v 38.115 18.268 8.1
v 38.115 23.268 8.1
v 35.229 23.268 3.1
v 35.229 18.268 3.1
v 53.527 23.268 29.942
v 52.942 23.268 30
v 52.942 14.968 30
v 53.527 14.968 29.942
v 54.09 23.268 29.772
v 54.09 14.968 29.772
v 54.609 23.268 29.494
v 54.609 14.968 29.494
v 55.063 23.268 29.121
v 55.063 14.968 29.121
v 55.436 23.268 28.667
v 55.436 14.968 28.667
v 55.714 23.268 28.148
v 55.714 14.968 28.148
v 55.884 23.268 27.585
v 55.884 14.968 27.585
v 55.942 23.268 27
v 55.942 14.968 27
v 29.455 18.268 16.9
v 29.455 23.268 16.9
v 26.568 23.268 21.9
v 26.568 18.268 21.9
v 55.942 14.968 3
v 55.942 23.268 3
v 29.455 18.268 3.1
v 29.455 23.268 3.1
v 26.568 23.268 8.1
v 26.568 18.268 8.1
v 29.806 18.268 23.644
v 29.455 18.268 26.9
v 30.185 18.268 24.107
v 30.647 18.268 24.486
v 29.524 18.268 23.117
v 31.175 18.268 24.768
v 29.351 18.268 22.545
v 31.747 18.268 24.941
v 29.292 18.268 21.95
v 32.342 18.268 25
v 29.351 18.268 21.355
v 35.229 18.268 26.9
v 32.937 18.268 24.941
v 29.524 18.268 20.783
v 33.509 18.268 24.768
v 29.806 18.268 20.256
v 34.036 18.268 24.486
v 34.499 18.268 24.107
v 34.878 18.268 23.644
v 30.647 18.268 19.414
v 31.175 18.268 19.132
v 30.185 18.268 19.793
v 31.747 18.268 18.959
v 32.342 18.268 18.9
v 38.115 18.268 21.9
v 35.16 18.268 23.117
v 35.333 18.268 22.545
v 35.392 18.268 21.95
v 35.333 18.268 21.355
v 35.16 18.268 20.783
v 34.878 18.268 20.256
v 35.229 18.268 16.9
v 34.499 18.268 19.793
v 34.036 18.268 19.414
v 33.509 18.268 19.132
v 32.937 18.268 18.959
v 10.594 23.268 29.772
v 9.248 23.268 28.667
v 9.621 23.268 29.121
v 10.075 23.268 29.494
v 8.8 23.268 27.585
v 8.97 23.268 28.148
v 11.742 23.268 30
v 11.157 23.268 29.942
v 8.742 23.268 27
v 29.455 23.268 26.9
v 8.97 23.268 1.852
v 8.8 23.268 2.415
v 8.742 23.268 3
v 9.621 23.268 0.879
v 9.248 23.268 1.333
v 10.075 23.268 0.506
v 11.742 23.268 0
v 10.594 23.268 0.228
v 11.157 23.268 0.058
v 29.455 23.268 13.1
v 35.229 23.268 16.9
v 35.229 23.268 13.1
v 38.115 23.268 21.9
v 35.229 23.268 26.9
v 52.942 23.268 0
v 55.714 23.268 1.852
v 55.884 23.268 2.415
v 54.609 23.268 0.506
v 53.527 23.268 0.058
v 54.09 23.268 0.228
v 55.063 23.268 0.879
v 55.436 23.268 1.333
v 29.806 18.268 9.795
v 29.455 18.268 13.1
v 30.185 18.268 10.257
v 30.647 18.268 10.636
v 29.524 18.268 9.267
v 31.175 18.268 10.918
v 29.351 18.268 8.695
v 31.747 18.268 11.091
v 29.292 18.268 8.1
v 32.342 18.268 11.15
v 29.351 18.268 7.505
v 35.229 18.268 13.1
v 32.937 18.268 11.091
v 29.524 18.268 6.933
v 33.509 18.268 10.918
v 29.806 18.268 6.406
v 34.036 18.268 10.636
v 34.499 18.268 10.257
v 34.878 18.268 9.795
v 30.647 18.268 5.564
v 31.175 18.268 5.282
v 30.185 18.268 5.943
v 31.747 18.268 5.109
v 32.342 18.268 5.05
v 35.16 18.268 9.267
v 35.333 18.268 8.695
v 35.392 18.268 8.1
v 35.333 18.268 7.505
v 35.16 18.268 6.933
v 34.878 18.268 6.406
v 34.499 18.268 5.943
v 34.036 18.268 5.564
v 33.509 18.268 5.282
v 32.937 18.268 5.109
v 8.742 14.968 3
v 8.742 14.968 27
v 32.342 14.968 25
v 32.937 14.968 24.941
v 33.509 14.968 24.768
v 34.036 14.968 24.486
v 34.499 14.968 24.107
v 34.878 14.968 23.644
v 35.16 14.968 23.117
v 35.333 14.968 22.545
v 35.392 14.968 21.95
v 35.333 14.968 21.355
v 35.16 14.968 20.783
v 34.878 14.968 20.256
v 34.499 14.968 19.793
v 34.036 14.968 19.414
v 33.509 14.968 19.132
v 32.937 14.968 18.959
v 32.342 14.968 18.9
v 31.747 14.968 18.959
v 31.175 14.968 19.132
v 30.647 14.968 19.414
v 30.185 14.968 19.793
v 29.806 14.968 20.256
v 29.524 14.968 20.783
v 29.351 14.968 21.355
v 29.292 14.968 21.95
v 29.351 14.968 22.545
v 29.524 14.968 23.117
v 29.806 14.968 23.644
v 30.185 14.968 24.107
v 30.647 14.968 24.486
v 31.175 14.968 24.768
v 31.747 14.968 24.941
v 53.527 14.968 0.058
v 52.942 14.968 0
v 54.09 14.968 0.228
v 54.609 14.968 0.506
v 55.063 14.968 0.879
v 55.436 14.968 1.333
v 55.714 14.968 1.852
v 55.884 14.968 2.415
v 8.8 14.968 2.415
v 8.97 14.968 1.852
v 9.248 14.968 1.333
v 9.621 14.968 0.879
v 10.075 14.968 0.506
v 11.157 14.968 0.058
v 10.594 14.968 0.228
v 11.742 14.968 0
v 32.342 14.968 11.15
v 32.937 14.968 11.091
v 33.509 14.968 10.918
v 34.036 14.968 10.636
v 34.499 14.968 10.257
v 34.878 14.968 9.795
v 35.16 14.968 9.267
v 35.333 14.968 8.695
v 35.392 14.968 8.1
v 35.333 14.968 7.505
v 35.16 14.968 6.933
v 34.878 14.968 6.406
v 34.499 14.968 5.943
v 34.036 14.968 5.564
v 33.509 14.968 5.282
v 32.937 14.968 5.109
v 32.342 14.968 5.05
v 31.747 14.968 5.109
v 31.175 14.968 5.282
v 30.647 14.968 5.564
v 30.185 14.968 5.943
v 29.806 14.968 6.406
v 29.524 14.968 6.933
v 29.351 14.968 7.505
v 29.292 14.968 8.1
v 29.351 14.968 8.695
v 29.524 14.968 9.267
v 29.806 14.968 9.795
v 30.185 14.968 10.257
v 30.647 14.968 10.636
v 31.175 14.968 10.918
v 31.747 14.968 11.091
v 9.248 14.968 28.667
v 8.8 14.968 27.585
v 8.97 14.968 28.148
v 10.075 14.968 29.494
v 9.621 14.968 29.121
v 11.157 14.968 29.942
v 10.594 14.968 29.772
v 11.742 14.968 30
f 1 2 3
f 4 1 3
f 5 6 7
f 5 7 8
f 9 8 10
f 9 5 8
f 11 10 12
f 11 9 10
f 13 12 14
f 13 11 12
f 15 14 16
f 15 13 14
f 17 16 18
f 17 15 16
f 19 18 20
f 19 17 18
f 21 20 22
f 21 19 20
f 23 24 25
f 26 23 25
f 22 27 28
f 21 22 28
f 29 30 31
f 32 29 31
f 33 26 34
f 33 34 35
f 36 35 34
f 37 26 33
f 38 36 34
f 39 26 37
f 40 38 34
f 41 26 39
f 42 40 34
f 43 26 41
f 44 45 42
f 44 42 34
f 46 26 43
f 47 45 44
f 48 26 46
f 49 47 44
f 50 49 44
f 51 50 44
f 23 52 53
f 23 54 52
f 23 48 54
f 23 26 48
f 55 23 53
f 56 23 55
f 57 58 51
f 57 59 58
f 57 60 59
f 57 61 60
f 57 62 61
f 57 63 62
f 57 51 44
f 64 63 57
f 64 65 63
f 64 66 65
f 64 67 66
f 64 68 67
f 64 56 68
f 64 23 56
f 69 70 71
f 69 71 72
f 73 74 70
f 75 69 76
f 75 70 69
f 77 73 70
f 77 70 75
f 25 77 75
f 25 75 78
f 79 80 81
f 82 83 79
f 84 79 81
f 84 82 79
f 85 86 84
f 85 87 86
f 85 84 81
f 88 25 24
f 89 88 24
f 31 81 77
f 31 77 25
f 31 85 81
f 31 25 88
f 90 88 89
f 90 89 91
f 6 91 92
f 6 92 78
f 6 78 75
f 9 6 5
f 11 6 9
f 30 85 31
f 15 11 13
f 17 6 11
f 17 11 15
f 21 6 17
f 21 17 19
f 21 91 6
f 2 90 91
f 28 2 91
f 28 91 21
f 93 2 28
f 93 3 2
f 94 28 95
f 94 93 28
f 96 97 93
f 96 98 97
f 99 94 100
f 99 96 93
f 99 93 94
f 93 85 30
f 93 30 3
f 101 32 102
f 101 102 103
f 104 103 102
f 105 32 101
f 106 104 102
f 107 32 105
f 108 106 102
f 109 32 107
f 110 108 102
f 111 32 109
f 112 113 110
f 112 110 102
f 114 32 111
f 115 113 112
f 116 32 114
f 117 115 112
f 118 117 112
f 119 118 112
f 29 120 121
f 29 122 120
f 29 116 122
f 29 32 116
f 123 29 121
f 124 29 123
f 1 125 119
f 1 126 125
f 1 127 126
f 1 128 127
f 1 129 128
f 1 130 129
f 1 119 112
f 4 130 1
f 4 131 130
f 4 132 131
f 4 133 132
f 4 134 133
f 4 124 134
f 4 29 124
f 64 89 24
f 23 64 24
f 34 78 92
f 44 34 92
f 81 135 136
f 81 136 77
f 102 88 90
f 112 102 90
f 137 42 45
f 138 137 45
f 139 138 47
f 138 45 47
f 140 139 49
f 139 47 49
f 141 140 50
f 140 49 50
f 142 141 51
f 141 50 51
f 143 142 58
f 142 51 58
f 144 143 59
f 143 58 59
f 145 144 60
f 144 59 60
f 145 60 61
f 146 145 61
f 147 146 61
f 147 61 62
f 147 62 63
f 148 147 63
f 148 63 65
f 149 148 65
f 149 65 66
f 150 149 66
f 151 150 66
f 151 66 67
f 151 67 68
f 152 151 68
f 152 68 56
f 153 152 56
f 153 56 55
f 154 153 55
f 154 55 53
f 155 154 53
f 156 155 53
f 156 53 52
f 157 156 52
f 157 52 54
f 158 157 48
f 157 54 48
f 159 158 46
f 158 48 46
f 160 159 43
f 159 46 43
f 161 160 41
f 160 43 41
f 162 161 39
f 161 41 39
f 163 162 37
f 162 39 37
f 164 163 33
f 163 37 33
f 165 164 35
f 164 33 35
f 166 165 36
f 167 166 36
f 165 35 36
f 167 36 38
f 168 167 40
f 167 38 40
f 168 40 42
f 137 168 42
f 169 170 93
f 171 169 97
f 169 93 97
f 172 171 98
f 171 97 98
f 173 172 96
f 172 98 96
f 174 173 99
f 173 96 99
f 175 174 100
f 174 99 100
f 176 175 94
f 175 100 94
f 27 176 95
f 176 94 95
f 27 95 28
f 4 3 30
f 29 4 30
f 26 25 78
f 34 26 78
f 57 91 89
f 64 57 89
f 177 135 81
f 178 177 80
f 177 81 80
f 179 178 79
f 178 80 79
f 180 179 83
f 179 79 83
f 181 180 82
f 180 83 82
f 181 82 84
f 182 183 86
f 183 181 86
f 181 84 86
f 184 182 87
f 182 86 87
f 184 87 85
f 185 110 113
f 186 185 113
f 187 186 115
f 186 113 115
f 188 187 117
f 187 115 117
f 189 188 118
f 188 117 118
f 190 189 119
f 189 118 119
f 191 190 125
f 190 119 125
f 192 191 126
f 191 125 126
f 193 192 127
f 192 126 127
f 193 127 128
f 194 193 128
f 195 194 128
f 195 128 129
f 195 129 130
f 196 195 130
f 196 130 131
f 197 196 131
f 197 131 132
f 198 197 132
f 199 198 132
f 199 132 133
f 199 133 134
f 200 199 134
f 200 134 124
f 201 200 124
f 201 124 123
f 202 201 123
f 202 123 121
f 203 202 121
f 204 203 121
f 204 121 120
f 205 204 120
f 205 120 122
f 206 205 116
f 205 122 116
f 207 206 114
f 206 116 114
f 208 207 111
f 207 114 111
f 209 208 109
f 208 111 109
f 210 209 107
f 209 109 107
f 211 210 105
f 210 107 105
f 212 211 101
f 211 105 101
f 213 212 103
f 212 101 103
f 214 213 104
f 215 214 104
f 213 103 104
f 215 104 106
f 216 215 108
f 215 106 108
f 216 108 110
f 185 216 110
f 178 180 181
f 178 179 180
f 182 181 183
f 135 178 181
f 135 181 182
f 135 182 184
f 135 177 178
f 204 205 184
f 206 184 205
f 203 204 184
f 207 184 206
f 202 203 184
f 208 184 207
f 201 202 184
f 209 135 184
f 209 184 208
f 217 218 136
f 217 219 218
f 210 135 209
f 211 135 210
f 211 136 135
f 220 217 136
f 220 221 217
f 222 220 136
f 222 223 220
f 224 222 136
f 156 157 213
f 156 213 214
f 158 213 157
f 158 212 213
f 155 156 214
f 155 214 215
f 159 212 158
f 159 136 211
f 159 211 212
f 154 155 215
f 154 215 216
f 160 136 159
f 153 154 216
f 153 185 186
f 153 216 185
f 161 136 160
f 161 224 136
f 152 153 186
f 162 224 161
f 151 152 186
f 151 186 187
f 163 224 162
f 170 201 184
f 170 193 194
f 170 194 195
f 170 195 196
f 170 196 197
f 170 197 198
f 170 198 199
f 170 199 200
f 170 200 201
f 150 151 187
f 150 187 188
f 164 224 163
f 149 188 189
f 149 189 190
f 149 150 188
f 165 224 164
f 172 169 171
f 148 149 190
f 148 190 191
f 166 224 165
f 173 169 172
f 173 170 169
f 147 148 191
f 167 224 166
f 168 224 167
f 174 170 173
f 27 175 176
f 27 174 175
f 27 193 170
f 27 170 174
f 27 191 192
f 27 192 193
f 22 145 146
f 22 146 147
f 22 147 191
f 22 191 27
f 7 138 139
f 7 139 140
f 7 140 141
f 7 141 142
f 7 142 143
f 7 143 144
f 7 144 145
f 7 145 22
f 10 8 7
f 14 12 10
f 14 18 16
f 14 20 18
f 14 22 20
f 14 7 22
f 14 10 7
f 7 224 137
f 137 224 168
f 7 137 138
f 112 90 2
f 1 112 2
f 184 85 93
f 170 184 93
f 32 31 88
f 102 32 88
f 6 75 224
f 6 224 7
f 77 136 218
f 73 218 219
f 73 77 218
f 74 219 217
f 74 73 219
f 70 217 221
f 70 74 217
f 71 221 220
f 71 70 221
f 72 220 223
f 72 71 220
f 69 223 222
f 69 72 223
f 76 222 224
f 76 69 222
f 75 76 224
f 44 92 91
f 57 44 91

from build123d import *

# Parameters (mm, degrees)
ESQUISSE2_W             = 47.2
ESQUISSE2_H             = 18.3
BOSS_EXTRU_3_DEPTH      = 30
ENL_V_MAT_EXTRU_1_DEPTH = 5
ESQUISSE6_R             = 3.05
ENL_V_MAT_EXTRU_2_DEPTH = 29
CONG_1_R                = 3
ESQUISSE7_W             = 56.209091813
ESQUISSE7_H             = 35.087501562
ENL_V_MAT_EXTRU_3_DEPTH = 10


with BuildPart() as part:
    # Esquisse2 → Boss.-Extru.3 (new body)
    with BuildSketch(Plane.XY):
        with Locations((32.341918096, 14.118251)):
            Rectangle(ESQUISSE2_W, ESQUISSE2_H)
    extrude(amount=BOSS_EXTRU_3_DEPTH)

    # Esquisse3 → Enlèv. mat.-Extru.1 (cut)
    with BuildSketch(Plane(origin=(0, 23.268251, 0), x_dir=(1, 0, 0), z_dir=(0, 1, 0))):
        Polygon((38.115420787, -8.1), (35.228669442, -3.1), (29.45516675, -3.1), (26.568415404, -8.1), (29.45516675, -13.1), (35.228669442, -13.1), align=None)
        Polygon((38.115420787, -21.9), (35.228669442, -16.9), (29.45516675, -16.9), (26.568415404, -21.9), (29.45516675, -26.9), (35.228669442, -26.9), align=None)
    extrude(amount=-ENL_V_MAT_EXTRU_1_DEPTH, mode=Mode.SUBTRACT)

    # Esquisse6 → Enlèv. mat.-Extru.2 (cut)
    with BuildSketch(Plane(origin=(0, 23.268251, 0), x_dir=(1, 0, 0), z_dir=(0, 1, 0))):
        with Locations(Location((32.341903964, -8.100016153, 0), (0, 0, 270))):
            Circle(ESQUISSE6_R)
        with Locations(Location((32.341903964, -21.95, 0), (0, 0, 270))):
            Circle(ESQUISSE6_R)
    extrude(amount=-ENL_V_MAT_EXTRU_2_DEPTH, mode=Mode.SUBTRACT)

    # Congé1
    cong_1_edges = [part.edges().sort_by_distance(p)[0] for p in [
        (55.941918096, 14.118251, 30),
        (8.741918096, 14.118251, 30),
        (55.941918096, 14.118251, 0),
        (8.741918096, 14.118251, 0),
    ]]
    fillet(cong_1_edges, radius=CONG_1_R)

    # Esquisse7 → Enlèv. mat.-Extru.3 (cut)
    with BuildSketch(Plane.XZ.offset(-4.968251)):
        with Locations((35.574310997, 14.252533976)):
            Rectangle(ESQUISSE7_W, ESQUISSE7_H)
    extrude(amount=-ENL_V_MAT_EXTRU_3_DEPTH, mode=Mode.SUBTRACT)


solid = part.part
